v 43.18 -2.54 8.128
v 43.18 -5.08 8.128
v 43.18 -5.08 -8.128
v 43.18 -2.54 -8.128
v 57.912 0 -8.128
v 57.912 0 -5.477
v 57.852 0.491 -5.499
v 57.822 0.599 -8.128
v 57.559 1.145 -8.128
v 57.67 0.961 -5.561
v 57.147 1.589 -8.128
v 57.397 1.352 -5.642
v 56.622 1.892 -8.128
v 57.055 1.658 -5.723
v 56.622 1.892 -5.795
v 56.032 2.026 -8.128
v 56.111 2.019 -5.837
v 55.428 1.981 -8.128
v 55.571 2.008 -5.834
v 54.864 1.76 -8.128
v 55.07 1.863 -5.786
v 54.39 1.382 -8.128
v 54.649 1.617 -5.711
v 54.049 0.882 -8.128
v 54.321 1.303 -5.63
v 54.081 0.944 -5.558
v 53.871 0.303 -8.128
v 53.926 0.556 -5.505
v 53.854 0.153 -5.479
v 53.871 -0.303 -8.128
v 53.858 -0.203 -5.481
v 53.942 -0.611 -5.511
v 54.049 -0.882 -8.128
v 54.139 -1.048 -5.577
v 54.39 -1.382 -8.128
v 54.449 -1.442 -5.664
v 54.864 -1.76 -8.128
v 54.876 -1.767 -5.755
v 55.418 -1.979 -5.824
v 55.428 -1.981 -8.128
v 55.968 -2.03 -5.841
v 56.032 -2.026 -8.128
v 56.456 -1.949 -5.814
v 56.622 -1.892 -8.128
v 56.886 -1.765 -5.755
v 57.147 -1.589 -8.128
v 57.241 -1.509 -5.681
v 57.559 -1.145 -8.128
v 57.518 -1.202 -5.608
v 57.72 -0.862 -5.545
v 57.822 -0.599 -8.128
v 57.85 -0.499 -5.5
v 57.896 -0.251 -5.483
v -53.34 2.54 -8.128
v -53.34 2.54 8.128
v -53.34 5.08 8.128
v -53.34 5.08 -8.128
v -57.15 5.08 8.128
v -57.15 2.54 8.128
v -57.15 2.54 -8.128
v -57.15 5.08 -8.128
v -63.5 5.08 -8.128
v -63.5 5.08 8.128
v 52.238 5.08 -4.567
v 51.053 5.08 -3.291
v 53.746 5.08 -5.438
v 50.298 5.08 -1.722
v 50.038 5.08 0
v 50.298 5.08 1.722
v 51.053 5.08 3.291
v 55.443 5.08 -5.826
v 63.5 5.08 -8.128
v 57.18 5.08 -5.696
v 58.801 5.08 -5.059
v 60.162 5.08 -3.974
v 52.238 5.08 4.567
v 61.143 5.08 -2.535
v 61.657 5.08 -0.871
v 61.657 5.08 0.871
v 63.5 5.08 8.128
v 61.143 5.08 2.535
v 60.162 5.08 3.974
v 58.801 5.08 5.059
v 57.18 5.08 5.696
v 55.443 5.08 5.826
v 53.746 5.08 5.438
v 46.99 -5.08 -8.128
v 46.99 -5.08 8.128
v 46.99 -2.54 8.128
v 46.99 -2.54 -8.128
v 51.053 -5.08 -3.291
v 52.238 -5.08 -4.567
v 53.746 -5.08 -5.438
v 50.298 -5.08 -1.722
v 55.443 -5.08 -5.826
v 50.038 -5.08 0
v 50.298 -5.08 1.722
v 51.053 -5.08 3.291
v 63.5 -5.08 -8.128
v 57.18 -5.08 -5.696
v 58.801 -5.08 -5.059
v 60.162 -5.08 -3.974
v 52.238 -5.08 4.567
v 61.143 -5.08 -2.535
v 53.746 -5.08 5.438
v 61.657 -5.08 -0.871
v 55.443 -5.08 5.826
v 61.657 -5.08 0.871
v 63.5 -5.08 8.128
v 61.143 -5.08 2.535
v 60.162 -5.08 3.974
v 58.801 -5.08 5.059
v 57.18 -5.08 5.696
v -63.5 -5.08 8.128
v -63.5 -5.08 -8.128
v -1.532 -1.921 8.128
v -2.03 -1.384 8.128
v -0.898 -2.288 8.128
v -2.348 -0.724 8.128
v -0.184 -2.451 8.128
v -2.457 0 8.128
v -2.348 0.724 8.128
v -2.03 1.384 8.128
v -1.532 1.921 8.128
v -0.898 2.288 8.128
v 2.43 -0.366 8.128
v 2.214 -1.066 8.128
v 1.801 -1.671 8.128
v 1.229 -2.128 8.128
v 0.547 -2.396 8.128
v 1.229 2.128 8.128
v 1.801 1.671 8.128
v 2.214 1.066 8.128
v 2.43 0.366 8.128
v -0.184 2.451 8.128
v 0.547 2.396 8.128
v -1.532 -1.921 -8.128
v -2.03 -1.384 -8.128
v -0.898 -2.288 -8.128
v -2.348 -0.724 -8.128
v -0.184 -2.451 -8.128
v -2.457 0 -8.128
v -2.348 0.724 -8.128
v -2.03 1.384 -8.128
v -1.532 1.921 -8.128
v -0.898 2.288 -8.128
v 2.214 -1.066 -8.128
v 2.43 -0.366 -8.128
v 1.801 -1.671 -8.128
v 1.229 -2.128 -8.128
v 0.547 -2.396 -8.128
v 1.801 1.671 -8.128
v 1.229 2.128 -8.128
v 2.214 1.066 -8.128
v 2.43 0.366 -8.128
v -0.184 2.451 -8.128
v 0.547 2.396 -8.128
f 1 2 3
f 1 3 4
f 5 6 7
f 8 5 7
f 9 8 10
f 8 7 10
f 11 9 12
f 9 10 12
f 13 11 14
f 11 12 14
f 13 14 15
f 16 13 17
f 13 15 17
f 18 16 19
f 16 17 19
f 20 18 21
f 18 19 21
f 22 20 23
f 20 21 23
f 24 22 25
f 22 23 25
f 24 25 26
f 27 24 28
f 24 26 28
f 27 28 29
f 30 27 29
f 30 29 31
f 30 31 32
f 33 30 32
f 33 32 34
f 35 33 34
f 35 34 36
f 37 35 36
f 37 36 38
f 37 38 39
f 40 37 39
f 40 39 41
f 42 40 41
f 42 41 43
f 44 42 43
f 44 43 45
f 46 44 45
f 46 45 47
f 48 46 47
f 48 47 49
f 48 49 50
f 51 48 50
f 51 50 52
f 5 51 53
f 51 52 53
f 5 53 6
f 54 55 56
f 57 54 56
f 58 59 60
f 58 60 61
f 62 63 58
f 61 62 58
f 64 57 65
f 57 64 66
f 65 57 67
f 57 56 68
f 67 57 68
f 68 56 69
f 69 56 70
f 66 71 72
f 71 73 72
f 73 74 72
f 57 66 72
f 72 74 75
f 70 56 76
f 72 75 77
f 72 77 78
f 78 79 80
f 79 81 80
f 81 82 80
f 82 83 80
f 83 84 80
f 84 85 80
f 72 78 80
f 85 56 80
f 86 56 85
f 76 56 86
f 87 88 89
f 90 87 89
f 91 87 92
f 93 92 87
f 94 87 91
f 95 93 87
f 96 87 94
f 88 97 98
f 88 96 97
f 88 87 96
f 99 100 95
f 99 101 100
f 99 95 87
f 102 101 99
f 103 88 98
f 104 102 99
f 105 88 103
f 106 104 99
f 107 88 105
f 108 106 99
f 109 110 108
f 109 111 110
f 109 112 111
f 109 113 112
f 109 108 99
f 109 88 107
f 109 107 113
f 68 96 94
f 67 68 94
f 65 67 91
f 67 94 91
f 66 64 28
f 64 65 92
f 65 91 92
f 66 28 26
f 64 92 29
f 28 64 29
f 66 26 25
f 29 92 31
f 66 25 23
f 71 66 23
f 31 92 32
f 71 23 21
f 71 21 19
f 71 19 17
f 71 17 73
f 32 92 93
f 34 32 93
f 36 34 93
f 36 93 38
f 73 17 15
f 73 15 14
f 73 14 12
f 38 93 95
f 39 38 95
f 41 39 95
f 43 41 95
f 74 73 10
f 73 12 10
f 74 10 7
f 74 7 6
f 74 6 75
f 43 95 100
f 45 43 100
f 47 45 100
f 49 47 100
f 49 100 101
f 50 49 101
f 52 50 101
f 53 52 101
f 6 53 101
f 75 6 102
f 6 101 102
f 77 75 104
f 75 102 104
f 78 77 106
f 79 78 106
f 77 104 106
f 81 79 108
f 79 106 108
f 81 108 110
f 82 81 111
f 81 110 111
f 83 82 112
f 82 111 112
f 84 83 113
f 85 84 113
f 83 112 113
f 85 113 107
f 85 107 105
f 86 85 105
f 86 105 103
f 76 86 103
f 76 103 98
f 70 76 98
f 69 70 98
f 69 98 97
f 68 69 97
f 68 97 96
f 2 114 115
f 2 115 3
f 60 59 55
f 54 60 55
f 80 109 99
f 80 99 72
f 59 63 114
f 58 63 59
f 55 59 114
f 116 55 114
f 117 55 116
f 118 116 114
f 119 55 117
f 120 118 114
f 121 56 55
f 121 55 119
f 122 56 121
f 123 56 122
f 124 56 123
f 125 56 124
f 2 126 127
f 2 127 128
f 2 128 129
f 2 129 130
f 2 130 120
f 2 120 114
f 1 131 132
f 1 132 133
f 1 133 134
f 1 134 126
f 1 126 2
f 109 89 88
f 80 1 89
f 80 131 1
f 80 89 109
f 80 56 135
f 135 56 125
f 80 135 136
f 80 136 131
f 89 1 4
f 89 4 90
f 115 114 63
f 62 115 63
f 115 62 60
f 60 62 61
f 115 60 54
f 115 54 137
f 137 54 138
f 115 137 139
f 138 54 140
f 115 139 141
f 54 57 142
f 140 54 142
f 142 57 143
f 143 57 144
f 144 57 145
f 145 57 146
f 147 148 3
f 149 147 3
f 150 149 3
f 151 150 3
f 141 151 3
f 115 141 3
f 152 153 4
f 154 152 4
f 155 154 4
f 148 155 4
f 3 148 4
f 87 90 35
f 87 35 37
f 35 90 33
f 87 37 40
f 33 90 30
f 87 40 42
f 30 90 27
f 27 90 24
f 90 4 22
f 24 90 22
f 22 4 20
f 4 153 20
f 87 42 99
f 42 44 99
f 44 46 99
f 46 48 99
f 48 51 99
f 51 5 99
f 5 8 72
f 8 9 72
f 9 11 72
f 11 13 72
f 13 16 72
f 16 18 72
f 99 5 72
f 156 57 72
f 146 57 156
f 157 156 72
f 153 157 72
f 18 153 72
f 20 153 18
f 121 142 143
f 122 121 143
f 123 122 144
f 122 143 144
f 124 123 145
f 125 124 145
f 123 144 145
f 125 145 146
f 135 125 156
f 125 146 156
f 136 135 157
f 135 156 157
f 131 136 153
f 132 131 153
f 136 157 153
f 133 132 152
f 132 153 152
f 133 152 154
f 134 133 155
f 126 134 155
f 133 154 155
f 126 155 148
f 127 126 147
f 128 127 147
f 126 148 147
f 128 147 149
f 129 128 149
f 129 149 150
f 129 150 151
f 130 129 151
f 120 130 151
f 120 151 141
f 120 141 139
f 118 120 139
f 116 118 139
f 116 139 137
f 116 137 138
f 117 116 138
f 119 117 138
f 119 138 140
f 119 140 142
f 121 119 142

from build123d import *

# Parameters (mm, degrees)
SKETCH1_W                    = 127
SKETCH1_H                    = 10.16
BOSS_EXTRUDE1_DEPTH          = 8.128
F_10_0_1935_DIAMETER_HOLE2_D = 4.9149
SKETCH6_W                    = 3.81
SKETCH6_H                    = 2.54
CUT_EXTRUDE1_DEPTH           = 16.256
HOLE1_D                      = 11.684
HOLE2_D                      = 4.064
HOLE2_DEPTH                  = 6.906051222
HOLE2_TIP                    = 1.220948778


with BuildPart() as part:
    # Sketch1 → Boss-Extrude1 (new body, symmetric)
    with BuildSketch(Plane.XY):
        Rectangle(SKETCH1_W, SKETCH1_H)
    extrude(amount=BOSS_EXTRUDE1_DEPTH, both=True)

    # #10 (0.1935) Diameter Hole2 (through all)
    with Locations(Plane.XY.offset(8.128)):
        with Locations((0, 0)):
            Hole(F_10_0_1935_DIAMETER_HOLE2_D / 2)

    # Sketch6 → Cut-Extrude1 (cut)
    with BuildSketch(Plane.XY.offset(8.128)):
        with Locations((-55.245, 3.81)):
            Rectangle(SKETCH6_W, SKETCH6_H)
        with Locations((45.085, -3.81)):
            Rectangle(SKETCH6_W, SKETCH6_H)
    extrude(amount=-CUT_EXTRUDE1_DEPTH, mode=Mode.SUBTRACT)

    # Hole1 (through all)
    with Locations(Plane(origin=(0, 5.08, 0), x_dir=(1, 0, 0), z_dir=(0, 1, 0))):
        with Locations((55.88, 0)):
            Hole(HOLE1_D / 2)

    # Hole2
    with Locations(Plane(origin=(0, 0, -8.128), x_dir=(-1, 0, 0), z_dir=(0, 0, -1))):
        with Locations((-55.88, 0)):
            Hole(HOLE2_D / 2, depth=HOLE2_DEPTH)
            with Locations((0, 0, -(HOLE2_DEPTH + HOLE2_TIP / 2))):  # 118° drill point
                Cone(0, HOLE2_D / 2, HOLE2_TIP, mode=Mode.SUBTRACT)


solid = part.part
